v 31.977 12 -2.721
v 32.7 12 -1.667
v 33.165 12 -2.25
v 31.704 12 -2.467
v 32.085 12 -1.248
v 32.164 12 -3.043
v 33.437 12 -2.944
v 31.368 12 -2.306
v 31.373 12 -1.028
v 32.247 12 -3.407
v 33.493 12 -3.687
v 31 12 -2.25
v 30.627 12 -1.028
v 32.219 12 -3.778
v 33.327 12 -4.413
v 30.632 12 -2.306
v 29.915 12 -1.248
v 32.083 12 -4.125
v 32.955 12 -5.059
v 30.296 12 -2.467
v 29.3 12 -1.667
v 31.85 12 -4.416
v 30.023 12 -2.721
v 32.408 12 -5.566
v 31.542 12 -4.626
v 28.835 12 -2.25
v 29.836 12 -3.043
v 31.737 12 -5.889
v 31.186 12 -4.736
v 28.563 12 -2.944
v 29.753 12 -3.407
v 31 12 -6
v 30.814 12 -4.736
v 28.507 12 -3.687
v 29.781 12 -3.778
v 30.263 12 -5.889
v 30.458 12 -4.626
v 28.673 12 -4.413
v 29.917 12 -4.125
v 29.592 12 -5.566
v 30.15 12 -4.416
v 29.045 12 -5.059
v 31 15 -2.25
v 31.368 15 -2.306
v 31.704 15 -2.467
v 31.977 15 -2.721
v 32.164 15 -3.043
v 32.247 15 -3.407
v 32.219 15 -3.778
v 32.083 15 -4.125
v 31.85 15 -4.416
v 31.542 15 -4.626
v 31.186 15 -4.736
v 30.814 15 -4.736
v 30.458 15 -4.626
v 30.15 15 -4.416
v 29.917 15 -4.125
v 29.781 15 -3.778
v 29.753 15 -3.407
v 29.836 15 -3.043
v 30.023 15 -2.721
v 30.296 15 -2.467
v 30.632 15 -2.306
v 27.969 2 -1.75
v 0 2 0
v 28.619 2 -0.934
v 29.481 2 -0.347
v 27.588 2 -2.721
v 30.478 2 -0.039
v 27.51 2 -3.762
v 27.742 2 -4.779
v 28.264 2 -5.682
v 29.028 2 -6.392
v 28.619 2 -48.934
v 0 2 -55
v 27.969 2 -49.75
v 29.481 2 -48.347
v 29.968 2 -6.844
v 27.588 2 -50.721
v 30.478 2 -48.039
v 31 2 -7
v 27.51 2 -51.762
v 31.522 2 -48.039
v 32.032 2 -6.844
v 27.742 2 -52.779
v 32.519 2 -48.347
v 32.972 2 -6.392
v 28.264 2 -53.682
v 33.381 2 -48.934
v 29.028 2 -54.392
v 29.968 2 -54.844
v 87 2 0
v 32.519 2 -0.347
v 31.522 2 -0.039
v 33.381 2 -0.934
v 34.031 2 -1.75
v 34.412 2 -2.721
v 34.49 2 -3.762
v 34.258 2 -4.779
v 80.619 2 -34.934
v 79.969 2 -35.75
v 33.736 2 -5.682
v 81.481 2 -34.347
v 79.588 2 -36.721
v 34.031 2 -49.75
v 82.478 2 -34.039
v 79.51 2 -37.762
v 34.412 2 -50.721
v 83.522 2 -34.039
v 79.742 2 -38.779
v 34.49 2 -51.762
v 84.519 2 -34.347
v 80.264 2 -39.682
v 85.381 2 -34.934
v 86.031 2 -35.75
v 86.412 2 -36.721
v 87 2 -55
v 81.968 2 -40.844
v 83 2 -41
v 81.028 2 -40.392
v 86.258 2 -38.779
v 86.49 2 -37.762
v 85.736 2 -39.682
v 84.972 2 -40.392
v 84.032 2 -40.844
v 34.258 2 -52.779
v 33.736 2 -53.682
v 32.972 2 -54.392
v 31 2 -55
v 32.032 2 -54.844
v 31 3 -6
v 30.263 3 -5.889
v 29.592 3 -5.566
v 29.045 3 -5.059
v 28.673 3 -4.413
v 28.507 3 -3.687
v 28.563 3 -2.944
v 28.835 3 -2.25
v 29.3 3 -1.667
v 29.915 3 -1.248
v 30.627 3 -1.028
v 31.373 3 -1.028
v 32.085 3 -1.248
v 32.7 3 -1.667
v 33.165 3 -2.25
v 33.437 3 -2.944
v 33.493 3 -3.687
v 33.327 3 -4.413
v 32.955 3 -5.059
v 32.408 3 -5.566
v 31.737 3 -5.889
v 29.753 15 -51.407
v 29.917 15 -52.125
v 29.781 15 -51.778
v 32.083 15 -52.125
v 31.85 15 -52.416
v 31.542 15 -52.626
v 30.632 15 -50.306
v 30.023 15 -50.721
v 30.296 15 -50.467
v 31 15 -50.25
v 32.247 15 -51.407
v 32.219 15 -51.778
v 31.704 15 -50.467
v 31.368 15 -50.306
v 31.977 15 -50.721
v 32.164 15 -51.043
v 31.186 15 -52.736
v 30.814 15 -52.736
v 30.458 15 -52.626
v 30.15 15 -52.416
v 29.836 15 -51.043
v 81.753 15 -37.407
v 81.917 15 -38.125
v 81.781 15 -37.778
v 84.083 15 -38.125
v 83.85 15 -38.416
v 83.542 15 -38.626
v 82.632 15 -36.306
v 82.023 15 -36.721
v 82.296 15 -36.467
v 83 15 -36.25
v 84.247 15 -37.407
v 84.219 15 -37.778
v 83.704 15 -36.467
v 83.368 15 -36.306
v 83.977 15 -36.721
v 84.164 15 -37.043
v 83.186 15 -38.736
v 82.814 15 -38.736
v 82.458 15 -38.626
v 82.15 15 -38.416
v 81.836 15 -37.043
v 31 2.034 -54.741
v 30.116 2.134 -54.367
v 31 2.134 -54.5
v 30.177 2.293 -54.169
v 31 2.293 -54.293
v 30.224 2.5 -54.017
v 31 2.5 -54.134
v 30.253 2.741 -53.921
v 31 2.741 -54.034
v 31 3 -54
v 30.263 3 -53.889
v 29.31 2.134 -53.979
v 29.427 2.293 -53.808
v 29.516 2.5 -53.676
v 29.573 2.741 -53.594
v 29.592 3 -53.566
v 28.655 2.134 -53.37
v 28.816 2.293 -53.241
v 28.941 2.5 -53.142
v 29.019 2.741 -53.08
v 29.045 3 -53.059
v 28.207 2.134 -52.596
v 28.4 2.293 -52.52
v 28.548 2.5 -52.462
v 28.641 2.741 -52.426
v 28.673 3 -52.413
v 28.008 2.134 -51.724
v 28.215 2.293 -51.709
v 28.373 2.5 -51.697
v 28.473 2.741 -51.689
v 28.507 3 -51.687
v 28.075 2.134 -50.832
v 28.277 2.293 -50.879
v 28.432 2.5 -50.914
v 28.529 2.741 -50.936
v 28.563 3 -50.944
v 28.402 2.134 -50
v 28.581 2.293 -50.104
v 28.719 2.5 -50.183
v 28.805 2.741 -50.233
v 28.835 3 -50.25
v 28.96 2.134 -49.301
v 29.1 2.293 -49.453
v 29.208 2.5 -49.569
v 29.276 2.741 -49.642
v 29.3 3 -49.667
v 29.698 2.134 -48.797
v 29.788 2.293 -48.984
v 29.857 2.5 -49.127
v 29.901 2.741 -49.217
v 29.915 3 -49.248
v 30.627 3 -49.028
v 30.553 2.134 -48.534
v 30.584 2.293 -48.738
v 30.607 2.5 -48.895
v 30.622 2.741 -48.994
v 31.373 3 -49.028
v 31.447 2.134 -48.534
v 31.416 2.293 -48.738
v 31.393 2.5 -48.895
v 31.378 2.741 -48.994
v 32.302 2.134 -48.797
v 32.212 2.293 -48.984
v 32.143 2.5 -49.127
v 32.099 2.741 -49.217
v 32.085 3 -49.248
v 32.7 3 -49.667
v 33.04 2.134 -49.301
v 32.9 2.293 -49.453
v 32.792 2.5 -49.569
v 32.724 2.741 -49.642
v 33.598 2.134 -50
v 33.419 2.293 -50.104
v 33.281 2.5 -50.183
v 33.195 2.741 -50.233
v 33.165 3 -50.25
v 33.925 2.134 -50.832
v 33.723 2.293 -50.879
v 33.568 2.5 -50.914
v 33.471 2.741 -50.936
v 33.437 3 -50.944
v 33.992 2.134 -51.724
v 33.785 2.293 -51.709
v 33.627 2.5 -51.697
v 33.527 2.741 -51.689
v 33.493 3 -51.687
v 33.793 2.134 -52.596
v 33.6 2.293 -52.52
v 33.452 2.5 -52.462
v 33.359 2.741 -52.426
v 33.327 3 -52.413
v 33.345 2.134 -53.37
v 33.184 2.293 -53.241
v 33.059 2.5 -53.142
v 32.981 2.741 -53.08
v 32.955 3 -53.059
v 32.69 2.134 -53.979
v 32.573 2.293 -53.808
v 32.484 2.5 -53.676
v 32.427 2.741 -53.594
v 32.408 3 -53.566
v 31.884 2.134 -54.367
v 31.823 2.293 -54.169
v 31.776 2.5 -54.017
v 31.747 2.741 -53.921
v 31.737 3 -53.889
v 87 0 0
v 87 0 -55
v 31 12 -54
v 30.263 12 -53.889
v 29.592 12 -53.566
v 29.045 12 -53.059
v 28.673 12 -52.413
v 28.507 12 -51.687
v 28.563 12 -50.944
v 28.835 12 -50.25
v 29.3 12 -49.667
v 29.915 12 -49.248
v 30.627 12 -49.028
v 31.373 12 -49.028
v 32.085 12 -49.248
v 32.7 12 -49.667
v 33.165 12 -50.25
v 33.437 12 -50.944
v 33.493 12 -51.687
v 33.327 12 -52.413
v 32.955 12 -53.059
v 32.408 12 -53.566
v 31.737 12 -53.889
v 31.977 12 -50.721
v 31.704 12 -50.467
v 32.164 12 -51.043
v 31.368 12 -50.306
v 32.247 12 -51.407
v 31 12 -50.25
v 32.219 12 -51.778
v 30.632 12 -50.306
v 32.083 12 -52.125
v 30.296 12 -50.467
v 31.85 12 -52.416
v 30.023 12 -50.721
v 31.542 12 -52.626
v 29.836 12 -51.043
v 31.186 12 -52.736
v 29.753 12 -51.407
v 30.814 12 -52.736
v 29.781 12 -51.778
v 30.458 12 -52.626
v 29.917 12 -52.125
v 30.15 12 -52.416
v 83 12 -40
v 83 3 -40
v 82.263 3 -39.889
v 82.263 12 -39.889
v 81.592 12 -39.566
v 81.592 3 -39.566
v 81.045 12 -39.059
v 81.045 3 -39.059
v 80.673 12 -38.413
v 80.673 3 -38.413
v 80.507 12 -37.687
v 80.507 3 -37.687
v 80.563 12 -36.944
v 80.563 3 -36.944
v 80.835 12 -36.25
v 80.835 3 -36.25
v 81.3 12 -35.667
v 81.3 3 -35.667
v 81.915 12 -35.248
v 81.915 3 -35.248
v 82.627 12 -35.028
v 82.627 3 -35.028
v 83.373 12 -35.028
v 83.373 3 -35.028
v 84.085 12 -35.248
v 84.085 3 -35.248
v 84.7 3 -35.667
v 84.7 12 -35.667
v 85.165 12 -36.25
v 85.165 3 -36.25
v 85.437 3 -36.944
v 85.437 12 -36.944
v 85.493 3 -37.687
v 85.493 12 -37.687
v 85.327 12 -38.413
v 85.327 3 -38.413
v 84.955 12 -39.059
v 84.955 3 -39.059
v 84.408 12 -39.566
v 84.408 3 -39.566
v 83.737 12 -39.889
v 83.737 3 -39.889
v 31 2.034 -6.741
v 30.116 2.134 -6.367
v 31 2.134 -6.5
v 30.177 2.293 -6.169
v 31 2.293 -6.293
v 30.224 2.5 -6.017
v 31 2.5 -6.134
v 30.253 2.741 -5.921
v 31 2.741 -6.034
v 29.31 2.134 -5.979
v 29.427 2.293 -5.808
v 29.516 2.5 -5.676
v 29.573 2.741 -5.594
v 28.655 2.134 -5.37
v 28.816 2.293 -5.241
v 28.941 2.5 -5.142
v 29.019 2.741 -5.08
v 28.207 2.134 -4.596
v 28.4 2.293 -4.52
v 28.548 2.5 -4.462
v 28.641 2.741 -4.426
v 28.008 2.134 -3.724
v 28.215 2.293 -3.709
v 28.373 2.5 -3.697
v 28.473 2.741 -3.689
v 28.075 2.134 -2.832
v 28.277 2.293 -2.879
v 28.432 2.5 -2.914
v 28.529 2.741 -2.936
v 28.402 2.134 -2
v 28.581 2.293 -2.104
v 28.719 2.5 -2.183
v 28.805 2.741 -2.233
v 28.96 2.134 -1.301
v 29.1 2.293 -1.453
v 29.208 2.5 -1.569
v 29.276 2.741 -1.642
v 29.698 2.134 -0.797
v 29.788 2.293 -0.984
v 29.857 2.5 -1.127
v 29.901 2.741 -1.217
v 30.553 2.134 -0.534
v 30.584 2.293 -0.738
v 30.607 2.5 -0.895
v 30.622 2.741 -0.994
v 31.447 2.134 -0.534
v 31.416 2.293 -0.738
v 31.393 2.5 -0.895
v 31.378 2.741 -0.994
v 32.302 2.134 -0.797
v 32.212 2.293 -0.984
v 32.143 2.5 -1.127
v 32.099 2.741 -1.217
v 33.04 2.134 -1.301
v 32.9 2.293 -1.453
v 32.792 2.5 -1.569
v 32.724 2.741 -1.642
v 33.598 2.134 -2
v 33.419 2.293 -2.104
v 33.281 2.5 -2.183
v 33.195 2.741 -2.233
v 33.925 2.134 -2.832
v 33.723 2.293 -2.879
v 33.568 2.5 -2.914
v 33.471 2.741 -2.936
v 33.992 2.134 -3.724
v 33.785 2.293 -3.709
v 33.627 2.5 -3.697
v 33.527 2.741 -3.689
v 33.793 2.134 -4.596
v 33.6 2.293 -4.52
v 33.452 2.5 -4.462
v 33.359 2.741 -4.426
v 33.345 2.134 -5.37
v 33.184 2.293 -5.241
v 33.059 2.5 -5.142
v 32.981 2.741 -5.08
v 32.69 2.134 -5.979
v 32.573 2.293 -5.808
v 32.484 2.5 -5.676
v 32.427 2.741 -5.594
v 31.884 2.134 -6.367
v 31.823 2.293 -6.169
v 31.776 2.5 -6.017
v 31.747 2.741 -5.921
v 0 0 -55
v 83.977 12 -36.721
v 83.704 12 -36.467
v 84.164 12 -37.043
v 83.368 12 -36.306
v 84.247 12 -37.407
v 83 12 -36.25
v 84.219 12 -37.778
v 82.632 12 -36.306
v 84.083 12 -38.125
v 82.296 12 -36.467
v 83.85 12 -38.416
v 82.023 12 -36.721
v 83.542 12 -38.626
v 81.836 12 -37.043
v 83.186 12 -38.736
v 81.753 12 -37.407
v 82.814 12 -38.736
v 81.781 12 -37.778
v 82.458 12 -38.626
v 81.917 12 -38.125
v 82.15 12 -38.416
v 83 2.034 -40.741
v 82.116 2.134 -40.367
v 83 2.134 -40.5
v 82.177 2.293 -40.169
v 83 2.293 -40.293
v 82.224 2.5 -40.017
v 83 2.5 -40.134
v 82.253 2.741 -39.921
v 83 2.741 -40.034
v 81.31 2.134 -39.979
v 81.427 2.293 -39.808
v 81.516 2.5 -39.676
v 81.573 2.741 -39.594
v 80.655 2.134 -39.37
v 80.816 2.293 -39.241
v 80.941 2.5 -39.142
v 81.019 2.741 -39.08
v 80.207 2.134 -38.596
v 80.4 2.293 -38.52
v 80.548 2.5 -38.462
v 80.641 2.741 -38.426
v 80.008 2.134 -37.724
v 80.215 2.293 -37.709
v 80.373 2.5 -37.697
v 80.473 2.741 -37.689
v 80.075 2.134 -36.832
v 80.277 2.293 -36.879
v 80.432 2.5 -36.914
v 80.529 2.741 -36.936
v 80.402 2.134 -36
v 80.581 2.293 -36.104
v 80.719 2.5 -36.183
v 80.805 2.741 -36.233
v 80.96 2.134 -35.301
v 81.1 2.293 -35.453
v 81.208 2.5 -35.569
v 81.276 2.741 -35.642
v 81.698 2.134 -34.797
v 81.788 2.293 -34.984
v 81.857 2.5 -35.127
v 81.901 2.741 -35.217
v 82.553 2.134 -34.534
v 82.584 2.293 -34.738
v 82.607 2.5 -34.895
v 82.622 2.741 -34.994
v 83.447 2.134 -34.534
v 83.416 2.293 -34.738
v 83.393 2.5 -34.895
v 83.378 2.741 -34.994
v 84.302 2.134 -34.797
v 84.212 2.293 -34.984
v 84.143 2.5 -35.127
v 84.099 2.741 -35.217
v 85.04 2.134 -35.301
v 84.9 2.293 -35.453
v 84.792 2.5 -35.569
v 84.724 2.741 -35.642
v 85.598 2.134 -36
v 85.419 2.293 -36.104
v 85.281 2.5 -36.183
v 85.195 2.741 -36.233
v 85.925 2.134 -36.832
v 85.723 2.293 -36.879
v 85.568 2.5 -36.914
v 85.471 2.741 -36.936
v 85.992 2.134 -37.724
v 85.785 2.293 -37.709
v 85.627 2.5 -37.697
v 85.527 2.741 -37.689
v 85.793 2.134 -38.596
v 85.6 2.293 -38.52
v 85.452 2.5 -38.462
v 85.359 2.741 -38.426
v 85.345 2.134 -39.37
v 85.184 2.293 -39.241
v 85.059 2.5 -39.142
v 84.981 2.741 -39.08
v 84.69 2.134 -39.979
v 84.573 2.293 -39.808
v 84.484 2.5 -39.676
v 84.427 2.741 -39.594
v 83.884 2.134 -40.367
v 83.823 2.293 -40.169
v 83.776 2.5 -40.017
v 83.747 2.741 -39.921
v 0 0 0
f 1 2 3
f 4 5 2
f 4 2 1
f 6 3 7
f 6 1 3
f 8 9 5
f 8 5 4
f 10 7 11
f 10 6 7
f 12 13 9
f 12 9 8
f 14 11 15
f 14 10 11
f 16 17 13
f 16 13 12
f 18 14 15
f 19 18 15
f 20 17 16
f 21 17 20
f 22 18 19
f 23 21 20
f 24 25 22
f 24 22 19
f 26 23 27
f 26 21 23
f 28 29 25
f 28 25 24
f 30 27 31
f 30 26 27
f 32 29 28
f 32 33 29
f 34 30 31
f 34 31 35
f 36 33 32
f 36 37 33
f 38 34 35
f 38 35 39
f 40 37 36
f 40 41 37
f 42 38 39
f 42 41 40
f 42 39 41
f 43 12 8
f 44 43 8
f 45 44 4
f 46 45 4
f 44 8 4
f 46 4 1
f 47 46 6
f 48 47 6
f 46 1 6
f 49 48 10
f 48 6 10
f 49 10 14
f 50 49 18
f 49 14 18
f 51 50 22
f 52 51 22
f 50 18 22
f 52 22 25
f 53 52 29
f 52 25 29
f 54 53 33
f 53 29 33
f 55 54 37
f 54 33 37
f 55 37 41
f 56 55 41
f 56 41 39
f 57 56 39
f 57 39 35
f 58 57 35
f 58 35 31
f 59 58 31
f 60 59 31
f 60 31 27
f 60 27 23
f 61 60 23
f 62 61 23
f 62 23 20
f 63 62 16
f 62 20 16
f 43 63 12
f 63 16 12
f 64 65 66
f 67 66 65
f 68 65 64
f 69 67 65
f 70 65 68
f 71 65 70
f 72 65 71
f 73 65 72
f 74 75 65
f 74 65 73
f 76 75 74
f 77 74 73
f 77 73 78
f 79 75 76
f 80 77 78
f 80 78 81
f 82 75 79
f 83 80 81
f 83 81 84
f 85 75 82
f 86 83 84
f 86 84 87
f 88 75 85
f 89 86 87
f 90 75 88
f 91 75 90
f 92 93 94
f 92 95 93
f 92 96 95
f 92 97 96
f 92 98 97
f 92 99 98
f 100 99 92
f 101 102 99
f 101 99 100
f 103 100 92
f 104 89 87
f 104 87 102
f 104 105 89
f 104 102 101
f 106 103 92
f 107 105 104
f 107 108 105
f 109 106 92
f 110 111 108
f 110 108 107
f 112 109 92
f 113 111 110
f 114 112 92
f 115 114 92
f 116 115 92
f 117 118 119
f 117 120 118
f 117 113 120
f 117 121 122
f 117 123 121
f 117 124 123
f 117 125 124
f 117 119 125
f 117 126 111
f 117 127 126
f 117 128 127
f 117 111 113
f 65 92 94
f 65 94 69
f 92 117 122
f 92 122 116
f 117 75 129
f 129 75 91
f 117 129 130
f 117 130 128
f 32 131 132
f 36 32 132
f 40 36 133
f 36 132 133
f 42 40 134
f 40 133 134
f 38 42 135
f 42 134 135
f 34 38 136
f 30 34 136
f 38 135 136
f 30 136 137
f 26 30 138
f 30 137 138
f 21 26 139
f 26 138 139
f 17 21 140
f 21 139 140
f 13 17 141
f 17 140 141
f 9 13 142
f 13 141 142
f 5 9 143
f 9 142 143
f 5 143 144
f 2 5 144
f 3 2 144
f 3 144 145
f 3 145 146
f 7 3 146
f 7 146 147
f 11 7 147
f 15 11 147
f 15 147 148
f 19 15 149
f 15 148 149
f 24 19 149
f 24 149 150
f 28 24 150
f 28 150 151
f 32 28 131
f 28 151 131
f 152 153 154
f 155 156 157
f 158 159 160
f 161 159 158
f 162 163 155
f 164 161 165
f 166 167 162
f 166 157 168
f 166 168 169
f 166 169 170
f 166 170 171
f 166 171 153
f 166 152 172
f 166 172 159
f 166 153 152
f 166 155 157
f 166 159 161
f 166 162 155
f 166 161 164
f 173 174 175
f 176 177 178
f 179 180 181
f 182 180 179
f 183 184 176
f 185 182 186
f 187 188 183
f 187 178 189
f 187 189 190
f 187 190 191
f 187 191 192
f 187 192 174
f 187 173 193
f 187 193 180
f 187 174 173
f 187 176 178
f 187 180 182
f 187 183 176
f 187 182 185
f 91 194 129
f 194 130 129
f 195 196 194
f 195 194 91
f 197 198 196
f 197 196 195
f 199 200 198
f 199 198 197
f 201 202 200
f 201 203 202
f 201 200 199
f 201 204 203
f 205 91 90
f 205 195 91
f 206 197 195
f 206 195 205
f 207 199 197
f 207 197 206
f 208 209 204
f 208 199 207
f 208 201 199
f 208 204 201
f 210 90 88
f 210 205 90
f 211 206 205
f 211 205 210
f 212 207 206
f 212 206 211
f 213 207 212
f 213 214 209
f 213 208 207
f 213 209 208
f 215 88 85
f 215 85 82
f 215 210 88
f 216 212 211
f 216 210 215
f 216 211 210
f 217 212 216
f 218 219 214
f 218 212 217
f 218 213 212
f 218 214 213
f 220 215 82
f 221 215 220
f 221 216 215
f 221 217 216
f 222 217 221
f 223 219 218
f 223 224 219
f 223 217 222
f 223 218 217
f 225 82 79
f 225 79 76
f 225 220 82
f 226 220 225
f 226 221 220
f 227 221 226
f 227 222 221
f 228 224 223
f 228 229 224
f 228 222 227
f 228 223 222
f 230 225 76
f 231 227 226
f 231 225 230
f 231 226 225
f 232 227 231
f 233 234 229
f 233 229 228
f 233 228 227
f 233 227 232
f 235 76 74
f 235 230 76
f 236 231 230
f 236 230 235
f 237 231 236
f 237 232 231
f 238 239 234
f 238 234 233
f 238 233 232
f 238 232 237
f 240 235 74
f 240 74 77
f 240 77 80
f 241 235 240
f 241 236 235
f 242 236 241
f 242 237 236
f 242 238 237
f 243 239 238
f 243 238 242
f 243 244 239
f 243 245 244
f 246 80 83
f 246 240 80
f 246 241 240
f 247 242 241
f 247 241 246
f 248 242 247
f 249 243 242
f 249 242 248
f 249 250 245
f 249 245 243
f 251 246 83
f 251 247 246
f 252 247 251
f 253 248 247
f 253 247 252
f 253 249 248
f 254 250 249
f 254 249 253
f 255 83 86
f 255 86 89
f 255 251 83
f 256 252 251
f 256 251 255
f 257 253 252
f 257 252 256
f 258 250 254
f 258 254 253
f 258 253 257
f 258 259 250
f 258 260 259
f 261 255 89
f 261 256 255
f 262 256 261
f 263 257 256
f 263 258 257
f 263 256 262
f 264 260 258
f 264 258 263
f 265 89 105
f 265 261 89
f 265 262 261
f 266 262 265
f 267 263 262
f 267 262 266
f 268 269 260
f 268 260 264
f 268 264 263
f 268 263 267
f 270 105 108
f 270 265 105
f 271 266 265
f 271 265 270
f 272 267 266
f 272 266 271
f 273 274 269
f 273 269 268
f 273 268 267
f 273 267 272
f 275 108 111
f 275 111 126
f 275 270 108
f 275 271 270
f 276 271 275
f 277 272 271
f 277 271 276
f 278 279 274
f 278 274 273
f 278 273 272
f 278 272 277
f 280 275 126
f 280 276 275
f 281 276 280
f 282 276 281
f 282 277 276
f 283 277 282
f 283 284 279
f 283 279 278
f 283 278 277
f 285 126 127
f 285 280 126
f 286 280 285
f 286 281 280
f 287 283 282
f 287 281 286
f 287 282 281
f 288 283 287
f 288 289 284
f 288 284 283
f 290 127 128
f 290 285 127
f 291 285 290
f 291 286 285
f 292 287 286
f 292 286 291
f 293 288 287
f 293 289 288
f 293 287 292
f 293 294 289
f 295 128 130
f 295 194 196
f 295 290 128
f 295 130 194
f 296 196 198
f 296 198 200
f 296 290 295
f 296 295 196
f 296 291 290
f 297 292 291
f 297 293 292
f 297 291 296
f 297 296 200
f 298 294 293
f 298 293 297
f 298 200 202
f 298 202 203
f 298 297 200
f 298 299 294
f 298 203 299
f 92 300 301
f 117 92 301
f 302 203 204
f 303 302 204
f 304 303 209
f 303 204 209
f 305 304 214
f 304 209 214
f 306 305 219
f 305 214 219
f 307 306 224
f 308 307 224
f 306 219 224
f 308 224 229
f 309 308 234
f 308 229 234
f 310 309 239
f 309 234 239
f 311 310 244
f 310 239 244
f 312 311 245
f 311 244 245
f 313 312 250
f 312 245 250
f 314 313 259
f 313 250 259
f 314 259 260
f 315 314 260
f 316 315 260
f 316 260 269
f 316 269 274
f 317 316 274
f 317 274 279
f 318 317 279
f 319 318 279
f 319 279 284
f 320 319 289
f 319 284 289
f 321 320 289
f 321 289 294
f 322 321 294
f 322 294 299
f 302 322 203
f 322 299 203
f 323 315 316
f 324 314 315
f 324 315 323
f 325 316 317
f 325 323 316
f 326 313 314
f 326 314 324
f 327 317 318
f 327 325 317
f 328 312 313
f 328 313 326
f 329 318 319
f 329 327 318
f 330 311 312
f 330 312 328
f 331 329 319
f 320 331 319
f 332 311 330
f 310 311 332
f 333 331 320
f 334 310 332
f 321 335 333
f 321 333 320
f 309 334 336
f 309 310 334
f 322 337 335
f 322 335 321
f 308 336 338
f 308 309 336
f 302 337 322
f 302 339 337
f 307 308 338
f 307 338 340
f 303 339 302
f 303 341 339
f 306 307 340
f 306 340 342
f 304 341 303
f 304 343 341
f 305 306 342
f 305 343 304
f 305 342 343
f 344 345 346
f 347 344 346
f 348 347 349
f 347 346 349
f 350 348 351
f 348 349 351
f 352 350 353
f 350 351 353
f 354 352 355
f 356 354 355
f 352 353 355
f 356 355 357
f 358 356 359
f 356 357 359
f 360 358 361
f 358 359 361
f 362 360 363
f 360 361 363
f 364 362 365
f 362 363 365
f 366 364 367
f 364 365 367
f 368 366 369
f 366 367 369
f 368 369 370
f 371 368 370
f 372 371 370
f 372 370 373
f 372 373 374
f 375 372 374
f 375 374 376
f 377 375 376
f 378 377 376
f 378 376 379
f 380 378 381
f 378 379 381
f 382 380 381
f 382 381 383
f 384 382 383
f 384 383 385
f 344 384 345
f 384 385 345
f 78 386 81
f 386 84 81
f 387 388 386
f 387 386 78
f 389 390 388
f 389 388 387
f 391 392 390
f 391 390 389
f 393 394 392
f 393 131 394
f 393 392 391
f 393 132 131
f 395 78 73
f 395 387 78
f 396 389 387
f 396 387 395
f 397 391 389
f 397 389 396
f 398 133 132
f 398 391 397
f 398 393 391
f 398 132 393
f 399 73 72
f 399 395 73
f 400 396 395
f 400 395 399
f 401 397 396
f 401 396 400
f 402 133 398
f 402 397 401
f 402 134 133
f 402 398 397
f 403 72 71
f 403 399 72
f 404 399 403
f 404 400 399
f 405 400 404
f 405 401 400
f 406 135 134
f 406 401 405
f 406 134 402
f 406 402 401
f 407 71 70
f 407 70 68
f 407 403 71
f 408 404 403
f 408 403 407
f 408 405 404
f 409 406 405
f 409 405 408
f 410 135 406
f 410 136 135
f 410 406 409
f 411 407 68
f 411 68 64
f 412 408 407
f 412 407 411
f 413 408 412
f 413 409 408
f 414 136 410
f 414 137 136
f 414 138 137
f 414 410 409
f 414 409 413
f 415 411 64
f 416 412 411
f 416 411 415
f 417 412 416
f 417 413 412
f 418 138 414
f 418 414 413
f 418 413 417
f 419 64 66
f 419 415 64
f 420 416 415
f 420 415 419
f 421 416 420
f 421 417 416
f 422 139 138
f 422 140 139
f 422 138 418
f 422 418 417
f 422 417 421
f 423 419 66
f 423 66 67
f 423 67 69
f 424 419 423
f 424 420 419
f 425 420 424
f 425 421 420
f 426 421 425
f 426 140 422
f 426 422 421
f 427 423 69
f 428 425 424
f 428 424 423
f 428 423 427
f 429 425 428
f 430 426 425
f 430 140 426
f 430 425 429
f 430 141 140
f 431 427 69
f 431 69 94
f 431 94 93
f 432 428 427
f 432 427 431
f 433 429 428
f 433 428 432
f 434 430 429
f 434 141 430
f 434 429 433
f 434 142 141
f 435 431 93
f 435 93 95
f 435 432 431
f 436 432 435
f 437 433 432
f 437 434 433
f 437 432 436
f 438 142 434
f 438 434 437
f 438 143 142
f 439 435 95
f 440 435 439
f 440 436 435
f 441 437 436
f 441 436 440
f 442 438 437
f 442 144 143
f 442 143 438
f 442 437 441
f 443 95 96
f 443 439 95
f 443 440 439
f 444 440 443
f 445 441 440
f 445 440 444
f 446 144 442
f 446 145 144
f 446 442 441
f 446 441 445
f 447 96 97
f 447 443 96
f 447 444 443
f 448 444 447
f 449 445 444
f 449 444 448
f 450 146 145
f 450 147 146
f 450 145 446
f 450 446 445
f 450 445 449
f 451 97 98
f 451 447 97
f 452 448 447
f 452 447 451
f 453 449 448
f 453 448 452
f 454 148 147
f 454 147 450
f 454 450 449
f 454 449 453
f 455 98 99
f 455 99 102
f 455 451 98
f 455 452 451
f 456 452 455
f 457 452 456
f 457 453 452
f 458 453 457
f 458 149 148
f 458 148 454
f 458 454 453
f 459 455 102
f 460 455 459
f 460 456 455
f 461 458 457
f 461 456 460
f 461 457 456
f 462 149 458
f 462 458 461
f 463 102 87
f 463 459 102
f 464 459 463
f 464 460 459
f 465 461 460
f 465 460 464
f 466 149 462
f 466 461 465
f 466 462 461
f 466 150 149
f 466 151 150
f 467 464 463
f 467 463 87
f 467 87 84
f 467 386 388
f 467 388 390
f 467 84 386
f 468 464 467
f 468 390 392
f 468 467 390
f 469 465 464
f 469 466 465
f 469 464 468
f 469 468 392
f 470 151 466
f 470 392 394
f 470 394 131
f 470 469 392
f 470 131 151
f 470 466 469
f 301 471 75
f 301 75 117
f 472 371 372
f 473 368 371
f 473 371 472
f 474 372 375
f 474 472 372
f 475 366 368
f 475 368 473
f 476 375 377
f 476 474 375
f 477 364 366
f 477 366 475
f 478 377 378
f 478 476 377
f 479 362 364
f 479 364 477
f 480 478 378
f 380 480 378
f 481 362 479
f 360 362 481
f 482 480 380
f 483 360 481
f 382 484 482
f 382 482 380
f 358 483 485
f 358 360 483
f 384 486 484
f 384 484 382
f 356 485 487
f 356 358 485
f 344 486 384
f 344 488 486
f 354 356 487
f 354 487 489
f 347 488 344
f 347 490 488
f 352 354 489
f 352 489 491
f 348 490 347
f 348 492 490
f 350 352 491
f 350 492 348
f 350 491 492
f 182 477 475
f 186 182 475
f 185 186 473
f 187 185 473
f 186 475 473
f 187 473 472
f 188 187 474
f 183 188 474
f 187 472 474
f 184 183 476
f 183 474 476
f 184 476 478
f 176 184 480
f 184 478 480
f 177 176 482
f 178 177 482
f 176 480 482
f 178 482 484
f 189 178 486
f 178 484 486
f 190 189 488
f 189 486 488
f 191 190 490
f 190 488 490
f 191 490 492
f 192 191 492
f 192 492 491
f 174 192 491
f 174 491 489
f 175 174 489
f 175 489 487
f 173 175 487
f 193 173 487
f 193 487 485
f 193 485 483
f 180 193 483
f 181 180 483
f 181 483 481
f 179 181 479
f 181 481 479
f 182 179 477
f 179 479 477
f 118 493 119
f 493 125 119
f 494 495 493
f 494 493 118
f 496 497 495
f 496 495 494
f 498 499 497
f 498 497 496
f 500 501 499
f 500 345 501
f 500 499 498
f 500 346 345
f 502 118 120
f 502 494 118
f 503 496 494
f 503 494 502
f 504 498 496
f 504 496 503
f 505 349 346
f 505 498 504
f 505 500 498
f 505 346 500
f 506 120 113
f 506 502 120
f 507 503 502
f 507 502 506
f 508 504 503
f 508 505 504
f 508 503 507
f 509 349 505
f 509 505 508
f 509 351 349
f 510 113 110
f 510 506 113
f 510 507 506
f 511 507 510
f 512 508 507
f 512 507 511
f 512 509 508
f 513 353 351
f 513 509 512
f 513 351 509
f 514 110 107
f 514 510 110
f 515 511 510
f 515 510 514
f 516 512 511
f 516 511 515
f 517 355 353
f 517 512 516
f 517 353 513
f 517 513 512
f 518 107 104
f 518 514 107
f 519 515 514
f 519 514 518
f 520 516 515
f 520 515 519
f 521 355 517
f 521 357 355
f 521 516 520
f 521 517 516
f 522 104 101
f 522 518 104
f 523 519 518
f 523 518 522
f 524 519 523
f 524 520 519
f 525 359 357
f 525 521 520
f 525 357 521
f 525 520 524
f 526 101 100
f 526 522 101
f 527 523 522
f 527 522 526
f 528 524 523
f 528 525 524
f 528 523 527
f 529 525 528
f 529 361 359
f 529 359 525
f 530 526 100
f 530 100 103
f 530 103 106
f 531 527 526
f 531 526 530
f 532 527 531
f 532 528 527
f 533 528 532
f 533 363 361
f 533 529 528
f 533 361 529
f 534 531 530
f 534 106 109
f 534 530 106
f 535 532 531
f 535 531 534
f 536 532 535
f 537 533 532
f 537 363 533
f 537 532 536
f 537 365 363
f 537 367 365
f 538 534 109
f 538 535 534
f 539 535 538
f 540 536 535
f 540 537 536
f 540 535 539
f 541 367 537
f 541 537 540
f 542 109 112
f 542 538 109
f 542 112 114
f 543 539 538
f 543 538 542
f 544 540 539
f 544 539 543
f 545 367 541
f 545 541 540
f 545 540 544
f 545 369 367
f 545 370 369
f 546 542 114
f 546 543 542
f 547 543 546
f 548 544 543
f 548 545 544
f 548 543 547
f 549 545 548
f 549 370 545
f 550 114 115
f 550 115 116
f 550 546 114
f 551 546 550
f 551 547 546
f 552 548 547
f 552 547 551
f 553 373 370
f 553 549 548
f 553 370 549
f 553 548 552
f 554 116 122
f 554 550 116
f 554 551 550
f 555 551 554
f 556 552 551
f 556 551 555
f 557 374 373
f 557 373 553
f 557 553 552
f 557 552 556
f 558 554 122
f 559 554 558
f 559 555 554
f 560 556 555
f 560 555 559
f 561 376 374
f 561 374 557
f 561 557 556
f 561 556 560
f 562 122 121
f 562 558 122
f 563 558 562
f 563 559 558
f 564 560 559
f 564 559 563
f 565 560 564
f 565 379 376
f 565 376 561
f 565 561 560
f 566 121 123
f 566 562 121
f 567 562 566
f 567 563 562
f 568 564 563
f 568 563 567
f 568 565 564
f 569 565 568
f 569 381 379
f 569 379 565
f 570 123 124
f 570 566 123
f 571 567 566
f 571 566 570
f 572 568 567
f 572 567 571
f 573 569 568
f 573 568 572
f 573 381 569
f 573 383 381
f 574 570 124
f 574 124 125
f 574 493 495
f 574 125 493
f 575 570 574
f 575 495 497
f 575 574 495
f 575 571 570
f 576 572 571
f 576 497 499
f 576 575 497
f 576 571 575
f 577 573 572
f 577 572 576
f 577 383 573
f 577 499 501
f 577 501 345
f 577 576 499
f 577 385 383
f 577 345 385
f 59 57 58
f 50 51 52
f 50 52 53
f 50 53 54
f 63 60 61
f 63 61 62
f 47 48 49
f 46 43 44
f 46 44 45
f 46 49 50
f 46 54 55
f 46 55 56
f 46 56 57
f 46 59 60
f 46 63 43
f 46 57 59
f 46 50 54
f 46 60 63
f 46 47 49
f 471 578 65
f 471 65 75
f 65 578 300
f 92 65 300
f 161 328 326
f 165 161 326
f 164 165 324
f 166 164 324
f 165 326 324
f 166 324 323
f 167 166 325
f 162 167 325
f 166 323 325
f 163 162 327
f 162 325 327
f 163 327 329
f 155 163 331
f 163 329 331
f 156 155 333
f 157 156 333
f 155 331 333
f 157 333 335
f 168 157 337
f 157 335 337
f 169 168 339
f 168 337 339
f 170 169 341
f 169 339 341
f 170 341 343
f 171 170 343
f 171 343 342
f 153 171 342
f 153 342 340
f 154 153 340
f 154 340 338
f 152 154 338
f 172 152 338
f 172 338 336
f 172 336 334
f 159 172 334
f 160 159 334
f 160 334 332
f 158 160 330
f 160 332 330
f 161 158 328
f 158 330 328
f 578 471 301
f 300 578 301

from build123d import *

# Parameters (mm, degrees)
SKETCH1_W           = 87
SKETCH1_H           = 55
BOSS_EXTRUDE1_DEPTH = 2
SKETCH2_R           = 2.5
BOSS_EXTRUDE2_DEPTH = 10
SKETCH3_R           = 1.25
BOSS_EXTRUDE3_DEPTH = 3
FILLET2_R           = 1


with BuildPart() as part:
    # Sketch1 → Boss-Extrude1 (new body)
    with BuildSketch(Plane(origin=(0, 0, 0), x_dir=(1, 0, 0), z_dir=(0, 1, 0))):
        with Locations((43.5, 27.5)):
            Rectangle(SKETCH1_W, SKETCH1_H)
    extrude(amount=BOSS_EXTRUDE1_DEPTH)

    # Sketch2 → Boss-Extrude2 (add)
    with BuildSketch(Plane(origin=(0, 2, 0), x_dir=(1, 0, 0), z_dir=(0, 1, 0))):
        with Locations(Location((31, 51.5, 0), (0, 0, 90))):
            Circle(SKETCH2_R)
        with Locations(Location((31, 3.5, 0), (0, 0, 90))):
            Circle(SKETCH2_R)
        with Locations(Location((83, 37.5, 0), (0, 0, 90))):
            Circle(SKETCH2_R)
    extrude(amount=BOSS_EXTRUDE2_DEPTH)

    # Sketch3 → Boss-Extrude3 (add)
    with BuildSketch(Plane(origin=(0, 12, 0), x_dir=(1, 0, 0), z_dir=(0, 1, 0))):
        with Locations(Location((31, 51.5, 0), (0, 0, 270))):
            Circle(SKETCH3_R)
        with Locations(Location((31, 3.5, 0), (0, 0, 270))):
            Circle(SKETCH3_R)
        with Locations(Location((83, 37.5, 0), (0, 0, 270))):
            Circle(SKETCH3_R)
    extrude(amount=BOSS_EXTRUDE3_DEPTH)

    # Fillet2
    fillet2_edges = [part.edges().sort_by_distance(p)[0] for p in [
        (83, 2, -35),
        (31, 2, -1),
        (31, 2, -49),
    ]]
    fillet(fillet2_edges, radius=FILLET2_R - 0.0001)  # a hair under: the kernel refuses the full size


solid = part.part
